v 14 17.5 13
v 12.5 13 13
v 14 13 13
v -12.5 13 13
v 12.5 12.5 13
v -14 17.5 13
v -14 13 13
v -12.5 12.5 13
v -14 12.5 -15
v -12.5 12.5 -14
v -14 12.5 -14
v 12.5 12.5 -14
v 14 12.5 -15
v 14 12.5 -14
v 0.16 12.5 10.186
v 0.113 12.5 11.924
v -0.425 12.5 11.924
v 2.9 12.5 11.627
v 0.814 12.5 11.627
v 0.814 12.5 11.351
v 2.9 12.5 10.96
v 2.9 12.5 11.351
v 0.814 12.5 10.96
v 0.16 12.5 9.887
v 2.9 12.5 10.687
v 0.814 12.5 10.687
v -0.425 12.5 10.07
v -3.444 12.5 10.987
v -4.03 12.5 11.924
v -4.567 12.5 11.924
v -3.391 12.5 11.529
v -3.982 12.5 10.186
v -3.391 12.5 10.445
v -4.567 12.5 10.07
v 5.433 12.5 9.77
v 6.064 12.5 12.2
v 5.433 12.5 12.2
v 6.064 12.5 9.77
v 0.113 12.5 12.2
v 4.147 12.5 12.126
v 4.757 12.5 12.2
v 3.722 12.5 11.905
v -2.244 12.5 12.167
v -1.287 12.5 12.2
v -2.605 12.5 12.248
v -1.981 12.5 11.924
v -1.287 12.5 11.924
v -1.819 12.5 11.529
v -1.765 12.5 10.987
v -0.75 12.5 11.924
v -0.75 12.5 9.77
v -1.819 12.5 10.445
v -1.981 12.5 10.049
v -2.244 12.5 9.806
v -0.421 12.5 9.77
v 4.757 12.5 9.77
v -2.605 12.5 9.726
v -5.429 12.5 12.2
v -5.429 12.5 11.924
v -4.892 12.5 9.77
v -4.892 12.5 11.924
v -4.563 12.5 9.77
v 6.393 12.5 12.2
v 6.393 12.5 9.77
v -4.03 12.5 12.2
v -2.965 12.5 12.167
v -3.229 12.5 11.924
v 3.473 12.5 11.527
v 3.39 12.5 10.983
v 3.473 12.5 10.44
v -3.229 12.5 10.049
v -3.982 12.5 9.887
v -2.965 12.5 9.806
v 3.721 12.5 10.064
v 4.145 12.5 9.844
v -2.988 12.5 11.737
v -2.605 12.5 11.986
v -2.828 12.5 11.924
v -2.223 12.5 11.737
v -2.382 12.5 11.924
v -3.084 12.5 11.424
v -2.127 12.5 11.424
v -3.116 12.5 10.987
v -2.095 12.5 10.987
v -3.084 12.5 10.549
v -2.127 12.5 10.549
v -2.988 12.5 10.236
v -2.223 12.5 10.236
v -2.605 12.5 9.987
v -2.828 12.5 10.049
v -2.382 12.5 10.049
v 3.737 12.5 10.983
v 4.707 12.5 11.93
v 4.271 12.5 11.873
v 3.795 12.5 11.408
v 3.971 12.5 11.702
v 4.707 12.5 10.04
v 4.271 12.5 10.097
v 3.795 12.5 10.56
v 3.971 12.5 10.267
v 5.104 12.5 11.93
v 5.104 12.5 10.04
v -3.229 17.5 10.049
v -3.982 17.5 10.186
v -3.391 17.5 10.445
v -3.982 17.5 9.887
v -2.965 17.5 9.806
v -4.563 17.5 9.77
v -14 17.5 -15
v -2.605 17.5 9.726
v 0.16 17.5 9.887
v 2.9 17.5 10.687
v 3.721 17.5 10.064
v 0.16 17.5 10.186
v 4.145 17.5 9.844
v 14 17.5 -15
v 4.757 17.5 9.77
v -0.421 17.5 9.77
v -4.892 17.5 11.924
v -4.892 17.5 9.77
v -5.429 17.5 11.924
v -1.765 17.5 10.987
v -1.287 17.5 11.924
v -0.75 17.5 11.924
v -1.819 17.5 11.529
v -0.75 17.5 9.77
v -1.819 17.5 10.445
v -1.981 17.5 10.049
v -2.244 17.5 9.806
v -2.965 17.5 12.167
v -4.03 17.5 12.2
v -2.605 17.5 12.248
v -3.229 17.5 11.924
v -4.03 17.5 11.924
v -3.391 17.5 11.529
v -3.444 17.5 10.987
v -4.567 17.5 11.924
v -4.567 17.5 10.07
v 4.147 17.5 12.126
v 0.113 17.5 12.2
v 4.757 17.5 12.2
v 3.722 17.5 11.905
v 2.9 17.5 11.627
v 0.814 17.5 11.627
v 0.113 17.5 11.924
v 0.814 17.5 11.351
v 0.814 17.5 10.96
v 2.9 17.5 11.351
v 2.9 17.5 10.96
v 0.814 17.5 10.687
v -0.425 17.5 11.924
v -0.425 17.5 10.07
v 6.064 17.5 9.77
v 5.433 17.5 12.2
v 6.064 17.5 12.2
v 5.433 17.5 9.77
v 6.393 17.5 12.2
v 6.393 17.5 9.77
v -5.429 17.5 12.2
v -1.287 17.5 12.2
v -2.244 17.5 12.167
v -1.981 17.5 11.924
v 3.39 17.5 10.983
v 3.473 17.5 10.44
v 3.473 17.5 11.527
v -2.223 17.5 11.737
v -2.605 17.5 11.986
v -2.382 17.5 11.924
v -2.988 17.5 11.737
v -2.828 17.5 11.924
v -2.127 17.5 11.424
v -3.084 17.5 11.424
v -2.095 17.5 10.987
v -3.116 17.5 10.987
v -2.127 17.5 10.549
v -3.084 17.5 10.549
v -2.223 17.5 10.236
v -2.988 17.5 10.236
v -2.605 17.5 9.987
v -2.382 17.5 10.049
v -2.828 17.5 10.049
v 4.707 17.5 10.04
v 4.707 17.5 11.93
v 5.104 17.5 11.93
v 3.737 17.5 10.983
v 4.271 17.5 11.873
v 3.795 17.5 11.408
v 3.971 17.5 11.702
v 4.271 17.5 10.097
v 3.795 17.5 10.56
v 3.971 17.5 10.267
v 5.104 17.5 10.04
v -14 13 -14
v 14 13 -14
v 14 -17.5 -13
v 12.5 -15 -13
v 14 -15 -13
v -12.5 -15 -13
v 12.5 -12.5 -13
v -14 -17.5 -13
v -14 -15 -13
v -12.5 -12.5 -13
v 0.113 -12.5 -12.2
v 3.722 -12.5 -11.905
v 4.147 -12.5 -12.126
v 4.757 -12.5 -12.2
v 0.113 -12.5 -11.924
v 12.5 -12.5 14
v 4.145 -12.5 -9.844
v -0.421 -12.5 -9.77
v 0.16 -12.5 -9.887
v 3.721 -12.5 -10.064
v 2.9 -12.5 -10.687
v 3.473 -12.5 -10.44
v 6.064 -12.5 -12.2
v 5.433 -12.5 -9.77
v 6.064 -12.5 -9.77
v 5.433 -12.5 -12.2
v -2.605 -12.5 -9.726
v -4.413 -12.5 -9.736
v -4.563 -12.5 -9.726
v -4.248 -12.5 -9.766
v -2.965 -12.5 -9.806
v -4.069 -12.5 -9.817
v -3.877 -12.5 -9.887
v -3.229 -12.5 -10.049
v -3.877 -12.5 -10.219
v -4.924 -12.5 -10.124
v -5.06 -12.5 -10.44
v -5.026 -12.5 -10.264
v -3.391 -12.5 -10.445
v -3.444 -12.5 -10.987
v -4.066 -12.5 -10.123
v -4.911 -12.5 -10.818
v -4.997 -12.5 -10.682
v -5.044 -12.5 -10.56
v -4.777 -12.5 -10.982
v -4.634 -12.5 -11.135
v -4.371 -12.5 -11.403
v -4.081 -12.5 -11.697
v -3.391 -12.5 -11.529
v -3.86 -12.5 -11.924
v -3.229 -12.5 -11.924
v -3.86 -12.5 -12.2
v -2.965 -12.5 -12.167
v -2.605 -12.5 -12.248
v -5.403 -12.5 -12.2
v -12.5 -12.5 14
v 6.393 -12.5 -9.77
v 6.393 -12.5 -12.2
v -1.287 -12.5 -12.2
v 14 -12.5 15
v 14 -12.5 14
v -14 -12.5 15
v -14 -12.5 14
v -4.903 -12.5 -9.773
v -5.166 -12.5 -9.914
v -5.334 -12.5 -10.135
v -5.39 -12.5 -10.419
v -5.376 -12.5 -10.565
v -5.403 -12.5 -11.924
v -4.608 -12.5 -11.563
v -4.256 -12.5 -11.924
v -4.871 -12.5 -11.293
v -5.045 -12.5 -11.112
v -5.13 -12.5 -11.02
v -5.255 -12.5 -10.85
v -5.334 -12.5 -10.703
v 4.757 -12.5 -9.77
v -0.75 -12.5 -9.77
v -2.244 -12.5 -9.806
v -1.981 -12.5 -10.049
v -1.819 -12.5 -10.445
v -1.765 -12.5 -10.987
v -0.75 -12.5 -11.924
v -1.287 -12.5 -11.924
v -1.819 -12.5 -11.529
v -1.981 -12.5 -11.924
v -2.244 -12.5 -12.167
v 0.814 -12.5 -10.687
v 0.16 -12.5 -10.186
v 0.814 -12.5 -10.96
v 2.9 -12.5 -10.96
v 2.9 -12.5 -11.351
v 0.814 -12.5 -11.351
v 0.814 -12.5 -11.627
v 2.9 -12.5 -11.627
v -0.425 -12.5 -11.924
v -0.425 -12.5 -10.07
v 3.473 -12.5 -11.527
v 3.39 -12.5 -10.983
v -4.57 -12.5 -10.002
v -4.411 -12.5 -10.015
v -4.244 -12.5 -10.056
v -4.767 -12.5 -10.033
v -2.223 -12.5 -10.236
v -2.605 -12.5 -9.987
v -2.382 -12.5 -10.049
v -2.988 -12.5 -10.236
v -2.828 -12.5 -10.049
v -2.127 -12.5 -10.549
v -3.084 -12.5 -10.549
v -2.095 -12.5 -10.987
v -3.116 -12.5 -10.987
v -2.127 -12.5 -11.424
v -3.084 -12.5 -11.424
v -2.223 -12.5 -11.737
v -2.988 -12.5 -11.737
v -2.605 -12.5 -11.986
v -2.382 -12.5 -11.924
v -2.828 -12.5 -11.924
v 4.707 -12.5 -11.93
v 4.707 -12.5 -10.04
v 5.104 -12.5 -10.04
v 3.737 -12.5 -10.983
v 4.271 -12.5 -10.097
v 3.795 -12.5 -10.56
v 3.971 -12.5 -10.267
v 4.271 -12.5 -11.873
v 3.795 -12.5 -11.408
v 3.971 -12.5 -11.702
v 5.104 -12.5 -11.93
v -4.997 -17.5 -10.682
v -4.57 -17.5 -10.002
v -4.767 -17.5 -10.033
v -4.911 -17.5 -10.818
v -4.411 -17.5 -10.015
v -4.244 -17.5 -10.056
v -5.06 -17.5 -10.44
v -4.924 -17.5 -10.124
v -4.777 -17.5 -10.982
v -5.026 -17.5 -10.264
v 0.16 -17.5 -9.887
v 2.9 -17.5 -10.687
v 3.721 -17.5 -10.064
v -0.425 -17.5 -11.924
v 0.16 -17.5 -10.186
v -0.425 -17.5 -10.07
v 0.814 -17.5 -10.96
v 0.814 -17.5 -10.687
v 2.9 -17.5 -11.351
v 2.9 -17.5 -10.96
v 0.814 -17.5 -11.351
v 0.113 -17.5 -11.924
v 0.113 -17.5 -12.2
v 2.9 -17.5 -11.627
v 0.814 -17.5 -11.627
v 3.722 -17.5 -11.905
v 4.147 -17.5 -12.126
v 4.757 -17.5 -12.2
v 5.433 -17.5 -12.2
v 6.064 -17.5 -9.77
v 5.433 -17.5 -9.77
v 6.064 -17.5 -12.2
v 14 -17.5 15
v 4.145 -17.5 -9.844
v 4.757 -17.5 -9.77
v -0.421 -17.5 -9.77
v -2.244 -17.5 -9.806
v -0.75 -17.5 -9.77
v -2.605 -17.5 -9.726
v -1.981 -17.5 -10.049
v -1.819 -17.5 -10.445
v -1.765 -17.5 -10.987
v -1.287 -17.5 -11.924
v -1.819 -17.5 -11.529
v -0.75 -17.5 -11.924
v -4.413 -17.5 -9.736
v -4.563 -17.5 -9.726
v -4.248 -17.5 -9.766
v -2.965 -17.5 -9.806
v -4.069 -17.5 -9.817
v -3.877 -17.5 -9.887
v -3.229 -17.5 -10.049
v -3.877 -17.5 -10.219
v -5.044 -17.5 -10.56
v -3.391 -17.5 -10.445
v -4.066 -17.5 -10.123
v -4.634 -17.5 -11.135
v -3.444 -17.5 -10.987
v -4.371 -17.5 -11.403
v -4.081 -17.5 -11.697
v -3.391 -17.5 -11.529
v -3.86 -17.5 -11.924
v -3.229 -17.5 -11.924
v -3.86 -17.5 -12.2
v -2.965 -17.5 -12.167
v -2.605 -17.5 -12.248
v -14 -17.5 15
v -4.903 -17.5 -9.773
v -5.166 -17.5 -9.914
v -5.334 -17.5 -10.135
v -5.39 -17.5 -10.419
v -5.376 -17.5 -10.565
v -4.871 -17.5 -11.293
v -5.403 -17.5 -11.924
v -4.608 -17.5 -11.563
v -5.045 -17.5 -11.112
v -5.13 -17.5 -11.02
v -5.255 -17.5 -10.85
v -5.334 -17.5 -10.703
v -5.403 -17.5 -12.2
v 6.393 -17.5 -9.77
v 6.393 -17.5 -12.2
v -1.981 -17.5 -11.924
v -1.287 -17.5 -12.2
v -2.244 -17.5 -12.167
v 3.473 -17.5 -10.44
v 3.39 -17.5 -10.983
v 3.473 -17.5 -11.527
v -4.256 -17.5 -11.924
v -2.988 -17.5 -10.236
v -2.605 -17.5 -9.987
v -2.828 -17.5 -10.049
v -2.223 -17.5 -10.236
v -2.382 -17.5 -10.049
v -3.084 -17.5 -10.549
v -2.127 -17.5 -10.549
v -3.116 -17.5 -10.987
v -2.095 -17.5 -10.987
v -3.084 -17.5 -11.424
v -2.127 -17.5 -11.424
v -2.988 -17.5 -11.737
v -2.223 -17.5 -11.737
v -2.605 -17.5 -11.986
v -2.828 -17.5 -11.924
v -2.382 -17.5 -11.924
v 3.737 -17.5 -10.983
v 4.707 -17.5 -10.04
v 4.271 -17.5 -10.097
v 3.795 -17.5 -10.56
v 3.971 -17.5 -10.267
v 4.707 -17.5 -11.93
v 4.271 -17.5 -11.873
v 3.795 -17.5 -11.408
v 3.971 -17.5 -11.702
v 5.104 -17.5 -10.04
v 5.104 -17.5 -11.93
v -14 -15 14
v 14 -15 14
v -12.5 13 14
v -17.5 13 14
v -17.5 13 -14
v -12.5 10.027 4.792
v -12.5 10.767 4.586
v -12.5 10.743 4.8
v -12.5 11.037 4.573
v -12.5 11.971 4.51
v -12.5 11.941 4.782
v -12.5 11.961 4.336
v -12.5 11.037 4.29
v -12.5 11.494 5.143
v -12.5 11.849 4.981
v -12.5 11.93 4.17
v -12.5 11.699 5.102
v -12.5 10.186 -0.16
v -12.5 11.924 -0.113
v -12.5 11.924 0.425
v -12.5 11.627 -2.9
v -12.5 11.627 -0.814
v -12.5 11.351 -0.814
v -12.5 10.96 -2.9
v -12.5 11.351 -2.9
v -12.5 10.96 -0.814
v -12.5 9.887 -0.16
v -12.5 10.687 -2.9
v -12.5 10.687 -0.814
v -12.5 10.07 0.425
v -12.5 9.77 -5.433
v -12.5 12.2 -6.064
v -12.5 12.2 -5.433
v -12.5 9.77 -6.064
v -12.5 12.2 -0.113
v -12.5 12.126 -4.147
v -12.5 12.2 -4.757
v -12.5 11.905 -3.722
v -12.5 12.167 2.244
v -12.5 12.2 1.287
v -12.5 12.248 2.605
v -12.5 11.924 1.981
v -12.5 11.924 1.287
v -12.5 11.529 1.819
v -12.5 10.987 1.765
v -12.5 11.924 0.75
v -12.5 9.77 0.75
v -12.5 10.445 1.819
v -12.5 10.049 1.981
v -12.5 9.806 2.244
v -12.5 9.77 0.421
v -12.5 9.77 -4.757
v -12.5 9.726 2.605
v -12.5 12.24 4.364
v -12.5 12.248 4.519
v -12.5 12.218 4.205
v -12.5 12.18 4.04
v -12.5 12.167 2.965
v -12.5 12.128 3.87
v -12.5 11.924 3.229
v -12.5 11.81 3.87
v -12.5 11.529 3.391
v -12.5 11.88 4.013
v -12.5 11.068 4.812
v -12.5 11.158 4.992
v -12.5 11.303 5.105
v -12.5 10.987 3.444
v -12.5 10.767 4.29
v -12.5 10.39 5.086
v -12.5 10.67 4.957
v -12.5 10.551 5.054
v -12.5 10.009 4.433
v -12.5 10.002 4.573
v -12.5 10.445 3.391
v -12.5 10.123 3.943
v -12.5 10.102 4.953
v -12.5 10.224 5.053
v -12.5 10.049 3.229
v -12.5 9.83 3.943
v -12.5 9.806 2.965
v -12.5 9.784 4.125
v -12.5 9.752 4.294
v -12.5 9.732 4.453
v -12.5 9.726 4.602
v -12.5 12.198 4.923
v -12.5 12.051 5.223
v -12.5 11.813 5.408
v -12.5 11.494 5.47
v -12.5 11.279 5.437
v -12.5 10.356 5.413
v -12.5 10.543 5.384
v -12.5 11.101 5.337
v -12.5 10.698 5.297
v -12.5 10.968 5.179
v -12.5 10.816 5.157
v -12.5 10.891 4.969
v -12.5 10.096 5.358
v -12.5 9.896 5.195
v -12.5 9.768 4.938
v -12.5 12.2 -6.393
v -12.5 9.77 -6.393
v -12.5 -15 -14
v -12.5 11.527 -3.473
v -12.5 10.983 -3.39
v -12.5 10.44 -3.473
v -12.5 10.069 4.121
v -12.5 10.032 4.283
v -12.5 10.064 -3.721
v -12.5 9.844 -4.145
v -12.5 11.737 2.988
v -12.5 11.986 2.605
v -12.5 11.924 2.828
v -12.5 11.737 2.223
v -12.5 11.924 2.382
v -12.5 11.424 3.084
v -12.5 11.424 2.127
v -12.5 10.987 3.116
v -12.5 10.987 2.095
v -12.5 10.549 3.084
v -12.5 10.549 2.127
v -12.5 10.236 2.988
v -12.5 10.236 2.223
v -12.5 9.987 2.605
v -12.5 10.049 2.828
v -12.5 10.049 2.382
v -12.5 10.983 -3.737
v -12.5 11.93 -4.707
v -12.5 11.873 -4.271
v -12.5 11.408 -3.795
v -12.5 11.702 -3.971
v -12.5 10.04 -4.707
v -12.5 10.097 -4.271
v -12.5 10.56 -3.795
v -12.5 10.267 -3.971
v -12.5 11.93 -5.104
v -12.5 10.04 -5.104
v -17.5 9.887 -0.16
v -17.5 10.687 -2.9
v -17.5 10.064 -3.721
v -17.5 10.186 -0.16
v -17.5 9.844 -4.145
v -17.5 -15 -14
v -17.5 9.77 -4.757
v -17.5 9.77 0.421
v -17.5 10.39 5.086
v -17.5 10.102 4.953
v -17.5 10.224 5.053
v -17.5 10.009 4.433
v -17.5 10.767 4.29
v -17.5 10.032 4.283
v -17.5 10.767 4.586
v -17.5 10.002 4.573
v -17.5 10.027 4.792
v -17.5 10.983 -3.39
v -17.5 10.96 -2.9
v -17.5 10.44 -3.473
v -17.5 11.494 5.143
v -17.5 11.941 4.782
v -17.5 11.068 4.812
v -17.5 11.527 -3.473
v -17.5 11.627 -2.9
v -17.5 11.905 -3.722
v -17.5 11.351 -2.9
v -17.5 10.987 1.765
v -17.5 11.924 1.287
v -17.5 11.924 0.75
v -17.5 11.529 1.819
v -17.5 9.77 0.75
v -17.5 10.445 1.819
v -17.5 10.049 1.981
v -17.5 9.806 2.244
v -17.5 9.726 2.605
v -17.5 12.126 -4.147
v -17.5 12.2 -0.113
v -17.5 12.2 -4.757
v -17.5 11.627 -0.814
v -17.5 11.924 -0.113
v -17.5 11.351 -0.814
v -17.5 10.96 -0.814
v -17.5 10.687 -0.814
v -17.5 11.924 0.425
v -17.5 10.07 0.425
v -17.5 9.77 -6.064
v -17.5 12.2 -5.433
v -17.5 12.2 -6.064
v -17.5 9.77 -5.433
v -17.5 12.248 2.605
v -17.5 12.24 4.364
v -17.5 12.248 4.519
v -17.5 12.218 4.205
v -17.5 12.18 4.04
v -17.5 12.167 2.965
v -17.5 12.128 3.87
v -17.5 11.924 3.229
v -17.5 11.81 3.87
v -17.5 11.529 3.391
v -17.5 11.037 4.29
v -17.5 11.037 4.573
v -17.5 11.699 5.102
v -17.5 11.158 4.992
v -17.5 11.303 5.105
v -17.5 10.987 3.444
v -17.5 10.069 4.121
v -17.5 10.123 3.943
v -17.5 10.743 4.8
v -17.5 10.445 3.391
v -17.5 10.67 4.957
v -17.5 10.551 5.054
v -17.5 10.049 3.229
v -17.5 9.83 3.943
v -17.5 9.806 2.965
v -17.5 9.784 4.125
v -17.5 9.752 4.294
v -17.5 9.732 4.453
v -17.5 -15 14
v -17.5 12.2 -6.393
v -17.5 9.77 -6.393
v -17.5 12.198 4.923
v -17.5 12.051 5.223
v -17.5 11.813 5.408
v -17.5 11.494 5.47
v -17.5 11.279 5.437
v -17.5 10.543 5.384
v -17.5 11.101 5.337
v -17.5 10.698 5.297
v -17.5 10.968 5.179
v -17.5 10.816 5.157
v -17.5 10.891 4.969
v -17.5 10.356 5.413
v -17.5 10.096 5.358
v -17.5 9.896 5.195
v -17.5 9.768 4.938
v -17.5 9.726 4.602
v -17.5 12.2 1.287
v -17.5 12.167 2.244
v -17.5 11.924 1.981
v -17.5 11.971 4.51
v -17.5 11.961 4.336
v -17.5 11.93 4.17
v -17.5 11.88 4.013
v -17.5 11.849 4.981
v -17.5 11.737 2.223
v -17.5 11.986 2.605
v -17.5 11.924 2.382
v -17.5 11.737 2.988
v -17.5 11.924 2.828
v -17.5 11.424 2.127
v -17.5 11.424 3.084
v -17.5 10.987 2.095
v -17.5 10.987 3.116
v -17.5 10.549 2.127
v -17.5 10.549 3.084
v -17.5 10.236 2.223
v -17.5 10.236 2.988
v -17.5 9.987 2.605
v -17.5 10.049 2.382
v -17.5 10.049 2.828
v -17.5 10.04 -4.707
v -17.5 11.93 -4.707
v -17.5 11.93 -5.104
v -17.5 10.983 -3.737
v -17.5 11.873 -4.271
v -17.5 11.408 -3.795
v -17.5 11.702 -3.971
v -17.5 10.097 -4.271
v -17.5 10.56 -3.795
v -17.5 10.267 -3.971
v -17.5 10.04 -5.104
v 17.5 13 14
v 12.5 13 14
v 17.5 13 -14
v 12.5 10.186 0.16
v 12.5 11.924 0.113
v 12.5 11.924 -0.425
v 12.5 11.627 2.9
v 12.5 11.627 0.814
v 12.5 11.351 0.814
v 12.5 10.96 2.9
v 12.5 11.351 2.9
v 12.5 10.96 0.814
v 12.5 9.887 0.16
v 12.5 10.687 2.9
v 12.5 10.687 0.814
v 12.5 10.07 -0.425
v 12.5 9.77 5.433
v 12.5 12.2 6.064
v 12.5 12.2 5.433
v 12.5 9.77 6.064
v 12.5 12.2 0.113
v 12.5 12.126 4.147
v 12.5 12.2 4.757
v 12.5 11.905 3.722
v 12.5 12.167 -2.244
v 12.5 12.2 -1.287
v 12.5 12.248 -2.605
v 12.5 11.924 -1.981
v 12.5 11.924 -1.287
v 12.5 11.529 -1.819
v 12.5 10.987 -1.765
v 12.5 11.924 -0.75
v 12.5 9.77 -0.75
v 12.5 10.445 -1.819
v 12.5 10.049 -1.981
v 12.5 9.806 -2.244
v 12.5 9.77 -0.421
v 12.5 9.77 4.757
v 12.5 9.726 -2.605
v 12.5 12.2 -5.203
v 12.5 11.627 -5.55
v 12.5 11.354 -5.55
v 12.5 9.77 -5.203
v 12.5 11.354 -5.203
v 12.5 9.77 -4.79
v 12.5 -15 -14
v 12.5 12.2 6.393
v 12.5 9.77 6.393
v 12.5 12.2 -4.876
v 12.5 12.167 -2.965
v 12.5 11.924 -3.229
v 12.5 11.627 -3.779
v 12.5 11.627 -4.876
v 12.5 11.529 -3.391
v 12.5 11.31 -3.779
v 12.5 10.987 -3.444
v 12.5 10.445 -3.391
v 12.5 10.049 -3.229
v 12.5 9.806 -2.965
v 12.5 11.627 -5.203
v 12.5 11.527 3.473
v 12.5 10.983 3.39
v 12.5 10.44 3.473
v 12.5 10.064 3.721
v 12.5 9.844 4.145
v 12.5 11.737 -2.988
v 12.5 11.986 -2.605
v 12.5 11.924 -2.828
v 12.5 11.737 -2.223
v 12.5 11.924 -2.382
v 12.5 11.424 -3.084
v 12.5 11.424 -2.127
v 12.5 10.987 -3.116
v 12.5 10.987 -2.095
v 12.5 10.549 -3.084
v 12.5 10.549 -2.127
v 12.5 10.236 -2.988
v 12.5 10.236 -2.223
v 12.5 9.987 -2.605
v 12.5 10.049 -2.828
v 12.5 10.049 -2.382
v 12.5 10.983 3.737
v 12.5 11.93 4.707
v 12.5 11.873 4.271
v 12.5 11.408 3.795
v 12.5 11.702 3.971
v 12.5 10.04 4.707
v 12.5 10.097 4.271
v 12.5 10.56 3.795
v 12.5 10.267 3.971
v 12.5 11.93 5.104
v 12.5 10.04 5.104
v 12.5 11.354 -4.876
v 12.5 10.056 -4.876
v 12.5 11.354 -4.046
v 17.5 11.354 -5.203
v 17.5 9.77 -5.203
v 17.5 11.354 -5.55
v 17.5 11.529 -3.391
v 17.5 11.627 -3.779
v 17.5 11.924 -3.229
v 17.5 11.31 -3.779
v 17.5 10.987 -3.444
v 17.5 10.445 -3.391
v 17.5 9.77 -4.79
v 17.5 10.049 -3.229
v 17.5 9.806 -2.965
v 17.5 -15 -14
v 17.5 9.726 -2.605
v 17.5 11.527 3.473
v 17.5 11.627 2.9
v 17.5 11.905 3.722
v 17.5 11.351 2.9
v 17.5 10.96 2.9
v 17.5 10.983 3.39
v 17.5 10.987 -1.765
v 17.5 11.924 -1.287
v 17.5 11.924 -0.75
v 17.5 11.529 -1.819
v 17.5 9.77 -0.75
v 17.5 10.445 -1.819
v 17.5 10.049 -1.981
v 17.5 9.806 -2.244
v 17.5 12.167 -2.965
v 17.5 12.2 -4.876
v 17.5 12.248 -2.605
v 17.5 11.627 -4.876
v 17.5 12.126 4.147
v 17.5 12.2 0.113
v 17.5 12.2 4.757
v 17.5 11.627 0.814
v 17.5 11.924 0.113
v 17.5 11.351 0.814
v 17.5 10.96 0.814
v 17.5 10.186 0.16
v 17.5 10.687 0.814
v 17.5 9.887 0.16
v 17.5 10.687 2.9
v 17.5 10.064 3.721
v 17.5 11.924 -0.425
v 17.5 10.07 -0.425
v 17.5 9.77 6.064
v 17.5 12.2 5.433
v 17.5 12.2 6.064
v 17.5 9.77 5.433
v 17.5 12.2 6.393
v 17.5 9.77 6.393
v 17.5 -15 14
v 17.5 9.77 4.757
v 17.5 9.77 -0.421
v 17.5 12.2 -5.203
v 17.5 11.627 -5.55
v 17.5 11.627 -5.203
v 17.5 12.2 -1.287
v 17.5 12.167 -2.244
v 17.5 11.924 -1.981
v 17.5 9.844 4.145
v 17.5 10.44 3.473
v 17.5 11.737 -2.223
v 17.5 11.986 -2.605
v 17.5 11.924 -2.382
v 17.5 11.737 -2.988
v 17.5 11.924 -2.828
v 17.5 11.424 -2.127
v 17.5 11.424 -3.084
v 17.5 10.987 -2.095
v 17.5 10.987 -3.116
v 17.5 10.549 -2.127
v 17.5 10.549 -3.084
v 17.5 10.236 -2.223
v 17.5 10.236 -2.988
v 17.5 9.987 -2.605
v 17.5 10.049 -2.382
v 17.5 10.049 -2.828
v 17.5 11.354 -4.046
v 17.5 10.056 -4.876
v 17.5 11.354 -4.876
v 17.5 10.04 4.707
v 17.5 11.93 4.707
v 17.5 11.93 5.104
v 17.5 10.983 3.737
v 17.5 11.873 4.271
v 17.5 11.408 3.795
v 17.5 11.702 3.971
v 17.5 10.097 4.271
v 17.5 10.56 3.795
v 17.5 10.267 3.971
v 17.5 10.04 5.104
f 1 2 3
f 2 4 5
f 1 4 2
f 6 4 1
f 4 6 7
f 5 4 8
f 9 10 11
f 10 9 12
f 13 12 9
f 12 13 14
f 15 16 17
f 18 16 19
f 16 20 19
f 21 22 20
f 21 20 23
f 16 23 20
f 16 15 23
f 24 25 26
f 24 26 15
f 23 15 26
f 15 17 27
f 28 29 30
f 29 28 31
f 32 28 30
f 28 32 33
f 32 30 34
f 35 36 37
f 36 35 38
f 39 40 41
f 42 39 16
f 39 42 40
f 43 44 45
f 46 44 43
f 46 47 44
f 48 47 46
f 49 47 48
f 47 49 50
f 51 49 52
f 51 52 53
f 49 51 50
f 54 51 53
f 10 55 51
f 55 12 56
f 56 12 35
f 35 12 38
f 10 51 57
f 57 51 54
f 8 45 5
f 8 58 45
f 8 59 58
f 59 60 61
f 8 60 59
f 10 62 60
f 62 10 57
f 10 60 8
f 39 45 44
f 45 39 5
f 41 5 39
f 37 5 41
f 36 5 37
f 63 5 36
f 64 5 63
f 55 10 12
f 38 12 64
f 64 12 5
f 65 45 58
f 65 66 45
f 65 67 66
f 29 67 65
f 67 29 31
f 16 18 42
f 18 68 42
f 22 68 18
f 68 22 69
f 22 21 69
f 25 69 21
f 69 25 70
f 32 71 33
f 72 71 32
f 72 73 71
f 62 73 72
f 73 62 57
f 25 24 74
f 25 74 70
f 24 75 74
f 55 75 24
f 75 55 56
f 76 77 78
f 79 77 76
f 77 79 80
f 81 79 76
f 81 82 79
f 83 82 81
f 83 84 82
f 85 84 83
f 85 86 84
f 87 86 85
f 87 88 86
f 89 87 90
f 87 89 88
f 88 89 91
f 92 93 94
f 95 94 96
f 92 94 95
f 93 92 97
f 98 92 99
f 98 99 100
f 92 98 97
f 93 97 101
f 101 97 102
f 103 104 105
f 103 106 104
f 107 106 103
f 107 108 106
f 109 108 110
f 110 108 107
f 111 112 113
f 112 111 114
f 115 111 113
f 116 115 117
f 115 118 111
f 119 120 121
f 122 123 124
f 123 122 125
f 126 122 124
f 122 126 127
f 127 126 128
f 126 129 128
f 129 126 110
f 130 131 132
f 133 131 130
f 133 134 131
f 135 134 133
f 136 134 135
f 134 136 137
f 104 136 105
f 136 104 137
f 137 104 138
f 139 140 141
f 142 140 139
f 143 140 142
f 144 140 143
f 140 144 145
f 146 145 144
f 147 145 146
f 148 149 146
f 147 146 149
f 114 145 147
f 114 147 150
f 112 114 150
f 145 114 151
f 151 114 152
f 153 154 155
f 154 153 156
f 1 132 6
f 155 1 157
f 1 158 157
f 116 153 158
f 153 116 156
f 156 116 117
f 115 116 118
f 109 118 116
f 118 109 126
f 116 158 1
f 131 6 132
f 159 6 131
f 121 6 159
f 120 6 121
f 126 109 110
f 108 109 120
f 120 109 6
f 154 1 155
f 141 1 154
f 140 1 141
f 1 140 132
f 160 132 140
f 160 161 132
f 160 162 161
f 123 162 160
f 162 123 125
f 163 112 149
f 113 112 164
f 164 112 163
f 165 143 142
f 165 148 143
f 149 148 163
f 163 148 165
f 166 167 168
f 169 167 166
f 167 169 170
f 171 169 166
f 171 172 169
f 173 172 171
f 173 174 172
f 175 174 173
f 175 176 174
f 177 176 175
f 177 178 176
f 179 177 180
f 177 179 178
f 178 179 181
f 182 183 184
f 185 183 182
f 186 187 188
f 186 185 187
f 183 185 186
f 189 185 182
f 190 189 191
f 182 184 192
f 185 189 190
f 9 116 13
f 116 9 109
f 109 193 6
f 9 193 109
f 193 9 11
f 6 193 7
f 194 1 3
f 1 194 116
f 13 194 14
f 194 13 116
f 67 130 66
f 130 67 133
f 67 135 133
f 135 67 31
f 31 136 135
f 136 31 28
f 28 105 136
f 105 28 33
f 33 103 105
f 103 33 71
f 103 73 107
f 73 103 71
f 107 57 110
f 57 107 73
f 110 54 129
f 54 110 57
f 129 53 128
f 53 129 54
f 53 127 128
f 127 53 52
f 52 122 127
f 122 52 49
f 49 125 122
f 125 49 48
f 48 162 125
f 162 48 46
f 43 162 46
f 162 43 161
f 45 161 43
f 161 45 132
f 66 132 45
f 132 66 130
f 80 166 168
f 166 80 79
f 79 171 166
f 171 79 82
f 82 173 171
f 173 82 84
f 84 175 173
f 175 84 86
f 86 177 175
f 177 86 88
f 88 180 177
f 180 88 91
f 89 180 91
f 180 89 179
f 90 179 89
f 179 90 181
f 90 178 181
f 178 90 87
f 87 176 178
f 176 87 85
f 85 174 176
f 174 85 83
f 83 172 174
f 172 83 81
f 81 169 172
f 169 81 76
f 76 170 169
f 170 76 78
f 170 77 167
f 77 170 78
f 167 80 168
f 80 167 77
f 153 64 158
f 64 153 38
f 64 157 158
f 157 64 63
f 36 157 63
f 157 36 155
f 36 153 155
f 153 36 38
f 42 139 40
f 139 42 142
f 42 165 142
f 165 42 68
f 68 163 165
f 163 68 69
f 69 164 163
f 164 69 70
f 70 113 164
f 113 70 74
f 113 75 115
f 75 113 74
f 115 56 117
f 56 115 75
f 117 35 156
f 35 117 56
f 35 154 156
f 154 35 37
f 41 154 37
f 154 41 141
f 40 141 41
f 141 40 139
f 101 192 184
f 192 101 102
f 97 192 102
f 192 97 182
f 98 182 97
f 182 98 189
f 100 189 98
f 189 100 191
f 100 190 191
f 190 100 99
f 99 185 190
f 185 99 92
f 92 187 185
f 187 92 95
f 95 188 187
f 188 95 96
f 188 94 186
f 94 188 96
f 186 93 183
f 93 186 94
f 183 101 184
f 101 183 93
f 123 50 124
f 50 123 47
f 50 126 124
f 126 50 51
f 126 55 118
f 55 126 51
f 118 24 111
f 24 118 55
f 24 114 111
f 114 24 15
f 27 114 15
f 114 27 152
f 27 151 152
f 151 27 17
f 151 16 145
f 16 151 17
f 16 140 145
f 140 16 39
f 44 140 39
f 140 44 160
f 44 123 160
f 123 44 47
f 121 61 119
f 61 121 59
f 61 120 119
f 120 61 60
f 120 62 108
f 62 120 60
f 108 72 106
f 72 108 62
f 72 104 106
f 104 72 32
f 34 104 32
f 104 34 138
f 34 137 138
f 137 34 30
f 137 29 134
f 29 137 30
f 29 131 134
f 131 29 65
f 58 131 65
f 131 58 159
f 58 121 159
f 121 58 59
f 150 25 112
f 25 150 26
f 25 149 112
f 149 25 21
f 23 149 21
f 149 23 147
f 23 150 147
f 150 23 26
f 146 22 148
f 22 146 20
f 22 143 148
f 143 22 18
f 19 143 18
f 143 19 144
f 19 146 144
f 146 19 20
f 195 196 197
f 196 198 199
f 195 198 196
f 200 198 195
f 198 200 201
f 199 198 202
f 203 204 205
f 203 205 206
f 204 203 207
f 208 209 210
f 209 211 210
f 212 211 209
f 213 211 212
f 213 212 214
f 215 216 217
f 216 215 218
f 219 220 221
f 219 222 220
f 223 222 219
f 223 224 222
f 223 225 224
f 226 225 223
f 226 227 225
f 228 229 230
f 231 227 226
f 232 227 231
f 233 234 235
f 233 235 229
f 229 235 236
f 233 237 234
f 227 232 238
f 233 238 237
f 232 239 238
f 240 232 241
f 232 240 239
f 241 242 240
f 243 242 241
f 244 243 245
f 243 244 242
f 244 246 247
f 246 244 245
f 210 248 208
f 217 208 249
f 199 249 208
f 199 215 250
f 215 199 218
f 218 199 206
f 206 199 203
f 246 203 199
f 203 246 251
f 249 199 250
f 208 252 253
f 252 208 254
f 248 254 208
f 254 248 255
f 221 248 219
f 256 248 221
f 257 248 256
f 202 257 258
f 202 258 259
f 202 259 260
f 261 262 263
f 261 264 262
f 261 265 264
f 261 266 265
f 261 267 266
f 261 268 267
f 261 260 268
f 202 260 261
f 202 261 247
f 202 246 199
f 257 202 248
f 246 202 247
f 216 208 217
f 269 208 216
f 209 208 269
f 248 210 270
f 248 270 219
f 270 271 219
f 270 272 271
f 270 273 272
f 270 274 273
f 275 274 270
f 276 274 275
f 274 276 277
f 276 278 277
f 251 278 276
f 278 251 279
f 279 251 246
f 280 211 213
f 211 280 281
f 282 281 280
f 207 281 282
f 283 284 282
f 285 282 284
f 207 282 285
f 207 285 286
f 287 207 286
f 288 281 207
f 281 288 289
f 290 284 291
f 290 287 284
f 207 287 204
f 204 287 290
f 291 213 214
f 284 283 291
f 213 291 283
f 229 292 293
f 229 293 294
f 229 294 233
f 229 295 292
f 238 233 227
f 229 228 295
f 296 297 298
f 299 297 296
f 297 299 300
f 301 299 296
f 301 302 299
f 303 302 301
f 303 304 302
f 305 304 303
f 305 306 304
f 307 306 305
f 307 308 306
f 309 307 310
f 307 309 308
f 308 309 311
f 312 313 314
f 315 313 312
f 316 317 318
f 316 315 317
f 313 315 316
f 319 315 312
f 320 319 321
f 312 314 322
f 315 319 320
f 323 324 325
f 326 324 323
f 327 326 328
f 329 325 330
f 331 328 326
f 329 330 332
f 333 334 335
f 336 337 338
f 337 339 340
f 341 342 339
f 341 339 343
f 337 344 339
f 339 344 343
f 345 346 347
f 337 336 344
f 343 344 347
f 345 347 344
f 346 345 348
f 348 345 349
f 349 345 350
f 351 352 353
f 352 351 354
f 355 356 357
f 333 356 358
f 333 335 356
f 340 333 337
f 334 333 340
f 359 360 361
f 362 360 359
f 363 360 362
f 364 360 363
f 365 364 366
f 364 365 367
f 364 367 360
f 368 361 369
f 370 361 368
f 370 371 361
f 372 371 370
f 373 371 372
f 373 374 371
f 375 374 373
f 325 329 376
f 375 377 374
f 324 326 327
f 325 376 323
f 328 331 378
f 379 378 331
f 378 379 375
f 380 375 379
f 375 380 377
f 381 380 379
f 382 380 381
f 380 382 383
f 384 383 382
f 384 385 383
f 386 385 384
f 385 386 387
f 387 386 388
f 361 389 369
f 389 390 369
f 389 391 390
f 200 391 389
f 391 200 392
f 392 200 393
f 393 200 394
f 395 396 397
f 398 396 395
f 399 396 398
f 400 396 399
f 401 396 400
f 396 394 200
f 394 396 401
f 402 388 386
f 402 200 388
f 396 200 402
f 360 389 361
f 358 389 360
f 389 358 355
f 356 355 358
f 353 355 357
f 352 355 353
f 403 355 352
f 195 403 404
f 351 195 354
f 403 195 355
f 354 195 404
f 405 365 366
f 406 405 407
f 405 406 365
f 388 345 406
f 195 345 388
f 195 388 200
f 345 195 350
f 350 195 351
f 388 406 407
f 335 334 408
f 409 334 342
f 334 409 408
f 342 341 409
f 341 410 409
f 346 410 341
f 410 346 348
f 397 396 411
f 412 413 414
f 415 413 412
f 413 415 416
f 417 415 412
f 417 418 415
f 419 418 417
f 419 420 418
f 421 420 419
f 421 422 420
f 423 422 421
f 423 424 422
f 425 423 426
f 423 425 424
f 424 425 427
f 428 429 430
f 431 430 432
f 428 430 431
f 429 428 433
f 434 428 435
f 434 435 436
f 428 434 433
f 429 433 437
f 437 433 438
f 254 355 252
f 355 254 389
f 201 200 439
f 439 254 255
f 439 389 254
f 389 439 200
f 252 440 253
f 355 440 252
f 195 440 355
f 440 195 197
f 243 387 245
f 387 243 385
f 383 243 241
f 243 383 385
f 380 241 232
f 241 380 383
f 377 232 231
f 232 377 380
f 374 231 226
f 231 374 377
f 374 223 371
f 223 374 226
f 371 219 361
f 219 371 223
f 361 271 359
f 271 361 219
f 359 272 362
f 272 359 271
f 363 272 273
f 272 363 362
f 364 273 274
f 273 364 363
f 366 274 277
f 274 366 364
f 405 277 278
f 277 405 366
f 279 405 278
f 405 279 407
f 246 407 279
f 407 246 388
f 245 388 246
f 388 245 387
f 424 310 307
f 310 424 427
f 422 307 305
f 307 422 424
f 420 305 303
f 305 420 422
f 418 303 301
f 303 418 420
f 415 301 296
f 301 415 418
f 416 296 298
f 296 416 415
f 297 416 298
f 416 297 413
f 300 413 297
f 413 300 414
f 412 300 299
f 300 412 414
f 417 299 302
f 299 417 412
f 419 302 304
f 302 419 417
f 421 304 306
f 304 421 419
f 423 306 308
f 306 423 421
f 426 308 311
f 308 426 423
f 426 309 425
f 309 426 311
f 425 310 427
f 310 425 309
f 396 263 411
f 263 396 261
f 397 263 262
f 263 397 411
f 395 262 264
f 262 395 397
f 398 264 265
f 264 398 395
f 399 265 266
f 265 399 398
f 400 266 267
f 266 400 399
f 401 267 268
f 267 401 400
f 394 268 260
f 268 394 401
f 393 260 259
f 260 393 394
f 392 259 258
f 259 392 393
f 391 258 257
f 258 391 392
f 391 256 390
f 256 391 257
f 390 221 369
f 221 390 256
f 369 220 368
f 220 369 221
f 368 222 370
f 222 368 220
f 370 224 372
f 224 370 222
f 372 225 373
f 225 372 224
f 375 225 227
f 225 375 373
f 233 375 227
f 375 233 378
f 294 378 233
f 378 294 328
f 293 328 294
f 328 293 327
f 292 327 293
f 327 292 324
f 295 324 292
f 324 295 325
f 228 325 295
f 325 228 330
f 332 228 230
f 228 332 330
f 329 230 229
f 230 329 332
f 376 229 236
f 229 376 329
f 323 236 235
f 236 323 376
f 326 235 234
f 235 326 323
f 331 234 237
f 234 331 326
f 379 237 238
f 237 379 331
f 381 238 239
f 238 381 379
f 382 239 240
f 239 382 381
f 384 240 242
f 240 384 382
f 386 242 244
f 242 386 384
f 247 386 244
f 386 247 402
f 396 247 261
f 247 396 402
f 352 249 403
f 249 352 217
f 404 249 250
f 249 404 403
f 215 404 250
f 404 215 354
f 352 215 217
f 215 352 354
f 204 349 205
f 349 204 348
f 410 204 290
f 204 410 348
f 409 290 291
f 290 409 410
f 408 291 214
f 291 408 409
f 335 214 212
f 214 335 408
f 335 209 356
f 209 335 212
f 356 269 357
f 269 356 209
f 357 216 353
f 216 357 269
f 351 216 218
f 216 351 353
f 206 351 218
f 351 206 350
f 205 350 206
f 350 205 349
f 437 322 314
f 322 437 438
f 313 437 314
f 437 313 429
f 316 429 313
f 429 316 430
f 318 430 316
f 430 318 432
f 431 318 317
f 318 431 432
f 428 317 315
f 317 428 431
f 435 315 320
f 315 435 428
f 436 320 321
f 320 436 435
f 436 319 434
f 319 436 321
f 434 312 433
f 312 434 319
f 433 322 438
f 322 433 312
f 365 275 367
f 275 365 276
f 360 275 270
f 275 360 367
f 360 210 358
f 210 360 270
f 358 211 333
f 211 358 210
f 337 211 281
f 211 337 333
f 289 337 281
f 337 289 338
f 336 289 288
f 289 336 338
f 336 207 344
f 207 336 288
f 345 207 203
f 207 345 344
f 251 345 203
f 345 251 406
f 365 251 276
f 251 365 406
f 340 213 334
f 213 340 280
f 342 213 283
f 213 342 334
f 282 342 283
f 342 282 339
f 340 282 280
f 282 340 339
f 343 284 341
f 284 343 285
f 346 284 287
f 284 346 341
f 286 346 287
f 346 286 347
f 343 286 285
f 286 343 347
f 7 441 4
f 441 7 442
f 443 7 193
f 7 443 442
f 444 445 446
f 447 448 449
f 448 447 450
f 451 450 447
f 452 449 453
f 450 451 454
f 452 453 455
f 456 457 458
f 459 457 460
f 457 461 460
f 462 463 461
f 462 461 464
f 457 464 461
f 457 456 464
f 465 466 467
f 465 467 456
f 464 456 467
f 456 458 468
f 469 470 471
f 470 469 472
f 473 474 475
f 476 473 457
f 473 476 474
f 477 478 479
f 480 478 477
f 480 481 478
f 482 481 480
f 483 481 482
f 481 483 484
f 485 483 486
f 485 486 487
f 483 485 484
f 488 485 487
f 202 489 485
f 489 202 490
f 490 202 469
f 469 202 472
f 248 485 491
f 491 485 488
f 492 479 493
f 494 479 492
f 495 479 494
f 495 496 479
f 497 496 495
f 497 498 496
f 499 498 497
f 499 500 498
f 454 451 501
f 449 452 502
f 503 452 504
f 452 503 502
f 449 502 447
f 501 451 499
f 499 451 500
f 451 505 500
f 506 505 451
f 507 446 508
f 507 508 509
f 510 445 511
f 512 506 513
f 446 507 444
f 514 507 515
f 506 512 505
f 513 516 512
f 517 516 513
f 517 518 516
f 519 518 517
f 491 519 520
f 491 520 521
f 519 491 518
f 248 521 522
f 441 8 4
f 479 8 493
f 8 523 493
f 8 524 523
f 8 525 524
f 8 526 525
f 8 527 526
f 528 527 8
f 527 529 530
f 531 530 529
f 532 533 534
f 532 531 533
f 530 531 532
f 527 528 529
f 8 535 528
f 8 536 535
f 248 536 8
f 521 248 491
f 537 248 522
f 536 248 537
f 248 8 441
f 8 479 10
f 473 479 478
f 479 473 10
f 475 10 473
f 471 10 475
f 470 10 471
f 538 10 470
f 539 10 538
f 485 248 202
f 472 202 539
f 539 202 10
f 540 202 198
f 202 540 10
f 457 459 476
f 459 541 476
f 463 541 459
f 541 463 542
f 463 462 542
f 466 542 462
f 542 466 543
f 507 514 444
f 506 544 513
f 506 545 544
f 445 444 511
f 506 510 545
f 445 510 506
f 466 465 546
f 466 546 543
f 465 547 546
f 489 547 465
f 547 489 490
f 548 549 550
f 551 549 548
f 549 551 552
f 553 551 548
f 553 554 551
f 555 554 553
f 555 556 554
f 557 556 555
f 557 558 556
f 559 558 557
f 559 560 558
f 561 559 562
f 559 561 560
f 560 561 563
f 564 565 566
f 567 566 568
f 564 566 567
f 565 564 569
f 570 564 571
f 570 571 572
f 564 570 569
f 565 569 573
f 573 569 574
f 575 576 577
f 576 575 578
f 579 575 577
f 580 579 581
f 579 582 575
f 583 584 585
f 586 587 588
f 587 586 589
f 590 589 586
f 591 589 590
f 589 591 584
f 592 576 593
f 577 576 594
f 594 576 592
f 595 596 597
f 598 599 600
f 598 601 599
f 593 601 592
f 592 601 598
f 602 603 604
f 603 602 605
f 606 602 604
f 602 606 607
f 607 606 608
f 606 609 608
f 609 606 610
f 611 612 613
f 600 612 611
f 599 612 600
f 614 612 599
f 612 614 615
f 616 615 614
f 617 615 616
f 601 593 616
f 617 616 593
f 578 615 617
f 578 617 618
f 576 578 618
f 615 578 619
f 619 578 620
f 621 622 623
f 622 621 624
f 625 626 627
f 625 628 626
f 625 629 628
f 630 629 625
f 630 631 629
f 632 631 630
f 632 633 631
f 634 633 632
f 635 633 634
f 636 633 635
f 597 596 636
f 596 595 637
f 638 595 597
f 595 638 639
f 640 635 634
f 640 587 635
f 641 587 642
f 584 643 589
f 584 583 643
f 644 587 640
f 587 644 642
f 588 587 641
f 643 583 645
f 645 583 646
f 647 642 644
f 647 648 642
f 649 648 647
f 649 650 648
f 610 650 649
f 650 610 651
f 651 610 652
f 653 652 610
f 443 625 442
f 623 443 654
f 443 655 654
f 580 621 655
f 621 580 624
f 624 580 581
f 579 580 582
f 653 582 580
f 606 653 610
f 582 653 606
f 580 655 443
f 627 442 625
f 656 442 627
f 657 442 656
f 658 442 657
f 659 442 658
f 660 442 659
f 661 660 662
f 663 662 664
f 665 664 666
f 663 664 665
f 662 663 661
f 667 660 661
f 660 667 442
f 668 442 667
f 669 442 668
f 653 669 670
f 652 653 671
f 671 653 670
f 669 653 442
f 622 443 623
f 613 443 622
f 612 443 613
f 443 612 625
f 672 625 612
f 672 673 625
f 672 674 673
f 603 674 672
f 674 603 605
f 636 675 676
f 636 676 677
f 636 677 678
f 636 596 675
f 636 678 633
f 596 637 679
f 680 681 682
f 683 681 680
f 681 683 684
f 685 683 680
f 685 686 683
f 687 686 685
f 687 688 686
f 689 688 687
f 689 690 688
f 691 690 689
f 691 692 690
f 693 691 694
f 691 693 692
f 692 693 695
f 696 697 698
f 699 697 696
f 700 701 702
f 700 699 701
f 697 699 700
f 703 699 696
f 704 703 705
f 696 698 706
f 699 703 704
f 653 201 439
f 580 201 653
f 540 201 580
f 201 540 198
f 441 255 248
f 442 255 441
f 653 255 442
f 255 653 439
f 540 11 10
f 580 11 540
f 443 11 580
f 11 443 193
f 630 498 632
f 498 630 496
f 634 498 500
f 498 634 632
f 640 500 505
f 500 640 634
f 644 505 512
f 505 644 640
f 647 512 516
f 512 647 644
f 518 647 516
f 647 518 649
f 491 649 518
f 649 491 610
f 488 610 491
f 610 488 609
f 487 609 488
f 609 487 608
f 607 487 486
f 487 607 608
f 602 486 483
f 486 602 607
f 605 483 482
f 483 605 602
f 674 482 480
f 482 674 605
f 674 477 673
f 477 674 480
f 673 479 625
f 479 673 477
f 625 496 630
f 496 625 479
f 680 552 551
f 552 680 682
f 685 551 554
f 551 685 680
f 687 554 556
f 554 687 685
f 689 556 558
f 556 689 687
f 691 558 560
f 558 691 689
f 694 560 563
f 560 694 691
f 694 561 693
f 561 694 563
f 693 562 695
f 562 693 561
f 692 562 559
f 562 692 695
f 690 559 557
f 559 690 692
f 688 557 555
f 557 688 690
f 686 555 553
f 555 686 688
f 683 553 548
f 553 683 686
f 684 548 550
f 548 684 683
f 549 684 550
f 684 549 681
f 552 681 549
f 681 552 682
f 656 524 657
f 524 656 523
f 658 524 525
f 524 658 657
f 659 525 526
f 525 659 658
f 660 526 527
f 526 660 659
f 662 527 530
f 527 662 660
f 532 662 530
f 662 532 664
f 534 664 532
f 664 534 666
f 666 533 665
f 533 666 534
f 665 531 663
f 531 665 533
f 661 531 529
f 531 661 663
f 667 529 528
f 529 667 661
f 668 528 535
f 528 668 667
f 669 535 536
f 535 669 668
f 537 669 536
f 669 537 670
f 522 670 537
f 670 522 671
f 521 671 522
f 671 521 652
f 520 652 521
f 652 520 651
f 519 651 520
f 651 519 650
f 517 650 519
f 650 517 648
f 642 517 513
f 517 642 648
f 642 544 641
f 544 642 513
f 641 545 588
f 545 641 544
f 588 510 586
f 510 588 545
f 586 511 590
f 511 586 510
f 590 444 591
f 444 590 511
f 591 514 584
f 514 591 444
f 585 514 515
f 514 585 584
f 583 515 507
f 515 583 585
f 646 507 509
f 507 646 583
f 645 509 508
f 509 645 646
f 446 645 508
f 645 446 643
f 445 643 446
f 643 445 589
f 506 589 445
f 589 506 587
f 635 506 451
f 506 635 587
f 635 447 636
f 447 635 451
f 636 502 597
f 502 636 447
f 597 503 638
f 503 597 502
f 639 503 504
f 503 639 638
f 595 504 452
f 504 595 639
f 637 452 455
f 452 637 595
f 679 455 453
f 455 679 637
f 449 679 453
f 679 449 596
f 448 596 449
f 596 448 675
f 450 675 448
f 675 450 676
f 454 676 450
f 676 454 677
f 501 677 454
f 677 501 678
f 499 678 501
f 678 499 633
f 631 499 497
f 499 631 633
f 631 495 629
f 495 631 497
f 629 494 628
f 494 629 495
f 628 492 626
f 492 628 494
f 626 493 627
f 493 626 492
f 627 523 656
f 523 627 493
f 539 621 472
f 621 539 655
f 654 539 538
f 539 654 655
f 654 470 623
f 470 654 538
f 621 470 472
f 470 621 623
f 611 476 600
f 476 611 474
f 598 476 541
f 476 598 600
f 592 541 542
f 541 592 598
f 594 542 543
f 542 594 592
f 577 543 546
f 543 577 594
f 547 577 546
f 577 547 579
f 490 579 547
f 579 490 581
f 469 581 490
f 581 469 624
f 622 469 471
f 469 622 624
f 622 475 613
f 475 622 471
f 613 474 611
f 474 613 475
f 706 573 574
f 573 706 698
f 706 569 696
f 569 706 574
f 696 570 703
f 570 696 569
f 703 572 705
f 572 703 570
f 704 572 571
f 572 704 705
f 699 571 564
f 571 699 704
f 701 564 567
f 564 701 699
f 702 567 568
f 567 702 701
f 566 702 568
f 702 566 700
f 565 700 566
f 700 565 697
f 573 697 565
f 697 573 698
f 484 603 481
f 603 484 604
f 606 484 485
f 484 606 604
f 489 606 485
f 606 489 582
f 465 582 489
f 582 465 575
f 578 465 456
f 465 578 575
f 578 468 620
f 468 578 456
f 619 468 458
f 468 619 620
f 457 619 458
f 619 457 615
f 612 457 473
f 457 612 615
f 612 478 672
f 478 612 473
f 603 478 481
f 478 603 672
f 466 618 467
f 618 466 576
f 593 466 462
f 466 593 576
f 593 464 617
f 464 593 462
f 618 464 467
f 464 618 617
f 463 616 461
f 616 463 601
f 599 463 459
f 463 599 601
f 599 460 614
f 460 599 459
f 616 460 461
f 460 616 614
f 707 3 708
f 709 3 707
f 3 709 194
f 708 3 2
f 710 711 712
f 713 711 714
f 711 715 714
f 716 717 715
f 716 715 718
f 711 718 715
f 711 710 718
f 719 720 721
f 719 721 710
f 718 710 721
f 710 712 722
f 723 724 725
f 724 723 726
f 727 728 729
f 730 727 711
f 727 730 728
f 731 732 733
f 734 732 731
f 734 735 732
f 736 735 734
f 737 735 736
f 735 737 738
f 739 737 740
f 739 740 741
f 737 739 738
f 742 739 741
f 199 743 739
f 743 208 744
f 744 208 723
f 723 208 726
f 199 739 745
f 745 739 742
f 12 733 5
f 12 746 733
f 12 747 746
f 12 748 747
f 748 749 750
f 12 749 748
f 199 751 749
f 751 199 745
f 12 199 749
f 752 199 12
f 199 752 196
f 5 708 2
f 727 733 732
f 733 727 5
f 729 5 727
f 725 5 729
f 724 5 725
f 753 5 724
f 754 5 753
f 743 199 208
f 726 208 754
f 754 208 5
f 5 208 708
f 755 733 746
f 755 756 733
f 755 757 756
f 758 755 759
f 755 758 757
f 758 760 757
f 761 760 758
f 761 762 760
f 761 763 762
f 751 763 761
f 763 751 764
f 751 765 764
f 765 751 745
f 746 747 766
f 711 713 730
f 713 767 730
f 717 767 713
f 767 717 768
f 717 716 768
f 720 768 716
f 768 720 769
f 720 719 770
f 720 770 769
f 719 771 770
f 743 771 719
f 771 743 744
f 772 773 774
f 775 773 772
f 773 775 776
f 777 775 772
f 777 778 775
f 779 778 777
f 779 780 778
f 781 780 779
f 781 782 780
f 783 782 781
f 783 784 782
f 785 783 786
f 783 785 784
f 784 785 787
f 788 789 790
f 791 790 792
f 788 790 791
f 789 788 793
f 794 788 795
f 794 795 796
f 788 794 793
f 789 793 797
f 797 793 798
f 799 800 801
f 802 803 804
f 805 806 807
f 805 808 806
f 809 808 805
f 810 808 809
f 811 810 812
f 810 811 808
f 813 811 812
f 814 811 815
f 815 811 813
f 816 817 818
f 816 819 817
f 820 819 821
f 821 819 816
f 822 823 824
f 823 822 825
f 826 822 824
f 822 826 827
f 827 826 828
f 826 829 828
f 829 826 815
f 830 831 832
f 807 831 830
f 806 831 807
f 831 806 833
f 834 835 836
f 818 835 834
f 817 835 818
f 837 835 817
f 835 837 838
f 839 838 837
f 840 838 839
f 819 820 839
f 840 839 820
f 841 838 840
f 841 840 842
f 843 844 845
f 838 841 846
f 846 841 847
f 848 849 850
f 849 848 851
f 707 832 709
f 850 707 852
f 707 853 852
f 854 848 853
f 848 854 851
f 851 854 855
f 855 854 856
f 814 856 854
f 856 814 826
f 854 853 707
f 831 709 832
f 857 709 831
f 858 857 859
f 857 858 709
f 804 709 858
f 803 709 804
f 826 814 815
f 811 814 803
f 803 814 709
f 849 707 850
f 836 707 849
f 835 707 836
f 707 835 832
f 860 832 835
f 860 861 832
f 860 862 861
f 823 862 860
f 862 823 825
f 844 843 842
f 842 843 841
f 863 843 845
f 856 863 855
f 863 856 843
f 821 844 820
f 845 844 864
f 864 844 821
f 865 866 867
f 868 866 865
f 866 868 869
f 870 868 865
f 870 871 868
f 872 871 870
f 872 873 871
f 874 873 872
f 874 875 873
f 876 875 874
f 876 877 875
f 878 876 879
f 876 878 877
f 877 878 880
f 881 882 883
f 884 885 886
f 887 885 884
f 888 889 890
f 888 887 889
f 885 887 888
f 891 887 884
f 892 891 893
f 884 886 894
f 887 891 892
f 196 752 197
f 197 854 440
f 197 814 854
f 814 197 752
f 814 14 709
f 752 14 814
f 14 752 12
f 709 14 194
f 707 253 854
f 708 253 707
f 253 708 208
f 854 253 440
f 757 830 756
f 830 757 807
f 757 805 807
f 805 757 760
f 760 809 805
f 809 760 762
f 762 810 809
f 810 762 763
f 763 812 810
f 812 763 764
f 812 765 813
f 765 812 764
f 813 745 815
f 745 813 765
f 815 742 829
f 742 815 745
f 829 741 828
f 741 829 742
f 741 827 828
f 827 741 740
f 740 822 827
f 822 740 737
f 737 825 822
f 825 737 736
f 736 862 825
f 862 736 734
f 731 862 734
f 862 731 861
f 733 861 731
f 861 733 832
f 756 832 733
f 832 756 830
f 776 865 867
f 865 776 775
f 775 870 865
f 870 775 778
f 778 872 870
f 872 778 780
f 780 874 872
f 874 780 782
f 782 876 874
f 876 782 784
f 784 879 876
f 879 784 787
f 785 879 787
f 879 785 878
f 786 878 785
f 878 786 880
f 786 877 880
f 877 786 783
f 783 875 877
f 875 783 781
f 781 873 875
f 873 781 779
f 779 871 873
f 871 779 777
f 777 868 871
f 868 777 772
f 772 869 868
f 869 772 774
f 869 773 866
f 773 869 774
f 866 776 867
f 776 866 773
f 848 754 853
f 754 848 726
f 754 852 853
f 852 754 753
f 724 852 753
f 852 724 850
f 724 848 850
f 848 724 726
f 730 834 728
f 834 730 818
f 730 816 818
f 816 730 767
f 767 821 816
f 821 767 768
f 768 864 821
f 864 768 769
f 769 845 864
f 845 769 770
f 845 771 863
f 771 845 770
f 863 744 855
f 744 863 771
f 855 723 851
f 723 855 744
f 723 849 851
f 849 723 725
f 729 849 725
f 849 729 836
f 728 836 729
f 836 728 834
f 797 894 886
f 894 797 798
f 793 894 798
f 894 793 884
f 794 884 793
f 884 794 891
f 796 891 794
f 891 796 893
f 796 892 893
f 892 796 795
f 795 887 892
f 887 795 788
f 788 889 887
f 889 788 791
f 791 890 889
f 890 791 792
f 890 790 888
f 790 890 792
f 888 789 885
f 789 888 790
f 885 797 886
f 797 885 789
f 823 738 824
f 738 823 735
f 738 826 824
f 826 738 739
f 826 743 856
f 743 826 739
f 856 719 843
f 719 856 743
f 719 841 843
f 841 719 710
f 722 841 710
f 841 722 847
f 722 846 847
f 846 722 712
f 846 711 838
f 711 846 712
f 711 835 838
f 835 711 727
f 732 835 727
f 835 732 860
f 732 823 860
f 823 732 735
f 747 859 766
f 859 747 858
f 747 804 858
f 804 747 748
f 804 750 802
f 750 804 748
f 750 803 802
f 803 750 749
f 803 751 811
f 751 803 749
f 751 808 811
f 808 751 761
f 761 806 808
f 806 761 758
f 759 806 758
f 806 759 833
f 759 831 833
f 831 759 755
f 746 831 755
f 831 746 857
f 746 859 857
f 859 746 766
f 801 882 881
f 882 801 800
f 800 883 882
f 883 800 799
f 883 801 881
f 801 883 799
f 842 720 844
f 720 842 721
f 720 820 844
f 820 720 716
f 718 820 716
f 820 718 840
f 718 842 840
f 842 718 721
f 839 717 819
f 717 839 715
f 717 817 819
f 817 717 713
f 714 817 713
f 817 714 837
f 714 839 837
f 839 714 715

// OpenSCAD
// file: modules.scad
zoom = [0.8,0.8,1];

module white( filename, text)
{
    scale(zoom)
    rotate([0,0,90]) 
    union(){ 
        translate([21.5,-8.4,-2.5])   rotate([0,0,90])  linear_extrude(5)  text (text,font="bold",size=3); 
        intersection() 
        {    
            cube([35,35,5],center=true); 
            translate([3,0,2.6])    scale([0.14,0.14,-1])  
            surface(file = filename, center = true); 
        } 
    } 

};

module black( filename, text)
{
    scale(zoom)
    rotate([0,0,90]) 
    difference() 
    {    
        translate([5,0,0])  cube([35,35,5],center=true); 
        translate([3,0,2.6])    scale([0.14,0.14,-1])  
        surface(file = filename, center = true);
        translate([21.5,-8.4,-2.5])   rotate([0,0,90])  linear_extrude(6)  text (text,font="bold",size=3);
    } 
}

module shape()
{
    scale(zoom)   rotate([0,0,90]) translate([5,0,0])  cube([35,35,5],center=true);  
}
// main file
include <modules.scad>

    union() color([0,1,0])
    {
        rotate([90,0,0])    translate([0,-5,-15])  black("../aruco/Marker101.png","ID=101");
        rotate([-90,0,0])    translate([0,-5,-15]) black("../aruco/Marker102.png","ID=102"); 
        rotate([00,90,0])    translate([0,-5,-15]) black("../aruco/Marker103.png","ID=103"); 
        rotate([00,-90,0])    translate([0,-5,-15])black("../aruco/Marker104.png","ID=104"); 
    }
